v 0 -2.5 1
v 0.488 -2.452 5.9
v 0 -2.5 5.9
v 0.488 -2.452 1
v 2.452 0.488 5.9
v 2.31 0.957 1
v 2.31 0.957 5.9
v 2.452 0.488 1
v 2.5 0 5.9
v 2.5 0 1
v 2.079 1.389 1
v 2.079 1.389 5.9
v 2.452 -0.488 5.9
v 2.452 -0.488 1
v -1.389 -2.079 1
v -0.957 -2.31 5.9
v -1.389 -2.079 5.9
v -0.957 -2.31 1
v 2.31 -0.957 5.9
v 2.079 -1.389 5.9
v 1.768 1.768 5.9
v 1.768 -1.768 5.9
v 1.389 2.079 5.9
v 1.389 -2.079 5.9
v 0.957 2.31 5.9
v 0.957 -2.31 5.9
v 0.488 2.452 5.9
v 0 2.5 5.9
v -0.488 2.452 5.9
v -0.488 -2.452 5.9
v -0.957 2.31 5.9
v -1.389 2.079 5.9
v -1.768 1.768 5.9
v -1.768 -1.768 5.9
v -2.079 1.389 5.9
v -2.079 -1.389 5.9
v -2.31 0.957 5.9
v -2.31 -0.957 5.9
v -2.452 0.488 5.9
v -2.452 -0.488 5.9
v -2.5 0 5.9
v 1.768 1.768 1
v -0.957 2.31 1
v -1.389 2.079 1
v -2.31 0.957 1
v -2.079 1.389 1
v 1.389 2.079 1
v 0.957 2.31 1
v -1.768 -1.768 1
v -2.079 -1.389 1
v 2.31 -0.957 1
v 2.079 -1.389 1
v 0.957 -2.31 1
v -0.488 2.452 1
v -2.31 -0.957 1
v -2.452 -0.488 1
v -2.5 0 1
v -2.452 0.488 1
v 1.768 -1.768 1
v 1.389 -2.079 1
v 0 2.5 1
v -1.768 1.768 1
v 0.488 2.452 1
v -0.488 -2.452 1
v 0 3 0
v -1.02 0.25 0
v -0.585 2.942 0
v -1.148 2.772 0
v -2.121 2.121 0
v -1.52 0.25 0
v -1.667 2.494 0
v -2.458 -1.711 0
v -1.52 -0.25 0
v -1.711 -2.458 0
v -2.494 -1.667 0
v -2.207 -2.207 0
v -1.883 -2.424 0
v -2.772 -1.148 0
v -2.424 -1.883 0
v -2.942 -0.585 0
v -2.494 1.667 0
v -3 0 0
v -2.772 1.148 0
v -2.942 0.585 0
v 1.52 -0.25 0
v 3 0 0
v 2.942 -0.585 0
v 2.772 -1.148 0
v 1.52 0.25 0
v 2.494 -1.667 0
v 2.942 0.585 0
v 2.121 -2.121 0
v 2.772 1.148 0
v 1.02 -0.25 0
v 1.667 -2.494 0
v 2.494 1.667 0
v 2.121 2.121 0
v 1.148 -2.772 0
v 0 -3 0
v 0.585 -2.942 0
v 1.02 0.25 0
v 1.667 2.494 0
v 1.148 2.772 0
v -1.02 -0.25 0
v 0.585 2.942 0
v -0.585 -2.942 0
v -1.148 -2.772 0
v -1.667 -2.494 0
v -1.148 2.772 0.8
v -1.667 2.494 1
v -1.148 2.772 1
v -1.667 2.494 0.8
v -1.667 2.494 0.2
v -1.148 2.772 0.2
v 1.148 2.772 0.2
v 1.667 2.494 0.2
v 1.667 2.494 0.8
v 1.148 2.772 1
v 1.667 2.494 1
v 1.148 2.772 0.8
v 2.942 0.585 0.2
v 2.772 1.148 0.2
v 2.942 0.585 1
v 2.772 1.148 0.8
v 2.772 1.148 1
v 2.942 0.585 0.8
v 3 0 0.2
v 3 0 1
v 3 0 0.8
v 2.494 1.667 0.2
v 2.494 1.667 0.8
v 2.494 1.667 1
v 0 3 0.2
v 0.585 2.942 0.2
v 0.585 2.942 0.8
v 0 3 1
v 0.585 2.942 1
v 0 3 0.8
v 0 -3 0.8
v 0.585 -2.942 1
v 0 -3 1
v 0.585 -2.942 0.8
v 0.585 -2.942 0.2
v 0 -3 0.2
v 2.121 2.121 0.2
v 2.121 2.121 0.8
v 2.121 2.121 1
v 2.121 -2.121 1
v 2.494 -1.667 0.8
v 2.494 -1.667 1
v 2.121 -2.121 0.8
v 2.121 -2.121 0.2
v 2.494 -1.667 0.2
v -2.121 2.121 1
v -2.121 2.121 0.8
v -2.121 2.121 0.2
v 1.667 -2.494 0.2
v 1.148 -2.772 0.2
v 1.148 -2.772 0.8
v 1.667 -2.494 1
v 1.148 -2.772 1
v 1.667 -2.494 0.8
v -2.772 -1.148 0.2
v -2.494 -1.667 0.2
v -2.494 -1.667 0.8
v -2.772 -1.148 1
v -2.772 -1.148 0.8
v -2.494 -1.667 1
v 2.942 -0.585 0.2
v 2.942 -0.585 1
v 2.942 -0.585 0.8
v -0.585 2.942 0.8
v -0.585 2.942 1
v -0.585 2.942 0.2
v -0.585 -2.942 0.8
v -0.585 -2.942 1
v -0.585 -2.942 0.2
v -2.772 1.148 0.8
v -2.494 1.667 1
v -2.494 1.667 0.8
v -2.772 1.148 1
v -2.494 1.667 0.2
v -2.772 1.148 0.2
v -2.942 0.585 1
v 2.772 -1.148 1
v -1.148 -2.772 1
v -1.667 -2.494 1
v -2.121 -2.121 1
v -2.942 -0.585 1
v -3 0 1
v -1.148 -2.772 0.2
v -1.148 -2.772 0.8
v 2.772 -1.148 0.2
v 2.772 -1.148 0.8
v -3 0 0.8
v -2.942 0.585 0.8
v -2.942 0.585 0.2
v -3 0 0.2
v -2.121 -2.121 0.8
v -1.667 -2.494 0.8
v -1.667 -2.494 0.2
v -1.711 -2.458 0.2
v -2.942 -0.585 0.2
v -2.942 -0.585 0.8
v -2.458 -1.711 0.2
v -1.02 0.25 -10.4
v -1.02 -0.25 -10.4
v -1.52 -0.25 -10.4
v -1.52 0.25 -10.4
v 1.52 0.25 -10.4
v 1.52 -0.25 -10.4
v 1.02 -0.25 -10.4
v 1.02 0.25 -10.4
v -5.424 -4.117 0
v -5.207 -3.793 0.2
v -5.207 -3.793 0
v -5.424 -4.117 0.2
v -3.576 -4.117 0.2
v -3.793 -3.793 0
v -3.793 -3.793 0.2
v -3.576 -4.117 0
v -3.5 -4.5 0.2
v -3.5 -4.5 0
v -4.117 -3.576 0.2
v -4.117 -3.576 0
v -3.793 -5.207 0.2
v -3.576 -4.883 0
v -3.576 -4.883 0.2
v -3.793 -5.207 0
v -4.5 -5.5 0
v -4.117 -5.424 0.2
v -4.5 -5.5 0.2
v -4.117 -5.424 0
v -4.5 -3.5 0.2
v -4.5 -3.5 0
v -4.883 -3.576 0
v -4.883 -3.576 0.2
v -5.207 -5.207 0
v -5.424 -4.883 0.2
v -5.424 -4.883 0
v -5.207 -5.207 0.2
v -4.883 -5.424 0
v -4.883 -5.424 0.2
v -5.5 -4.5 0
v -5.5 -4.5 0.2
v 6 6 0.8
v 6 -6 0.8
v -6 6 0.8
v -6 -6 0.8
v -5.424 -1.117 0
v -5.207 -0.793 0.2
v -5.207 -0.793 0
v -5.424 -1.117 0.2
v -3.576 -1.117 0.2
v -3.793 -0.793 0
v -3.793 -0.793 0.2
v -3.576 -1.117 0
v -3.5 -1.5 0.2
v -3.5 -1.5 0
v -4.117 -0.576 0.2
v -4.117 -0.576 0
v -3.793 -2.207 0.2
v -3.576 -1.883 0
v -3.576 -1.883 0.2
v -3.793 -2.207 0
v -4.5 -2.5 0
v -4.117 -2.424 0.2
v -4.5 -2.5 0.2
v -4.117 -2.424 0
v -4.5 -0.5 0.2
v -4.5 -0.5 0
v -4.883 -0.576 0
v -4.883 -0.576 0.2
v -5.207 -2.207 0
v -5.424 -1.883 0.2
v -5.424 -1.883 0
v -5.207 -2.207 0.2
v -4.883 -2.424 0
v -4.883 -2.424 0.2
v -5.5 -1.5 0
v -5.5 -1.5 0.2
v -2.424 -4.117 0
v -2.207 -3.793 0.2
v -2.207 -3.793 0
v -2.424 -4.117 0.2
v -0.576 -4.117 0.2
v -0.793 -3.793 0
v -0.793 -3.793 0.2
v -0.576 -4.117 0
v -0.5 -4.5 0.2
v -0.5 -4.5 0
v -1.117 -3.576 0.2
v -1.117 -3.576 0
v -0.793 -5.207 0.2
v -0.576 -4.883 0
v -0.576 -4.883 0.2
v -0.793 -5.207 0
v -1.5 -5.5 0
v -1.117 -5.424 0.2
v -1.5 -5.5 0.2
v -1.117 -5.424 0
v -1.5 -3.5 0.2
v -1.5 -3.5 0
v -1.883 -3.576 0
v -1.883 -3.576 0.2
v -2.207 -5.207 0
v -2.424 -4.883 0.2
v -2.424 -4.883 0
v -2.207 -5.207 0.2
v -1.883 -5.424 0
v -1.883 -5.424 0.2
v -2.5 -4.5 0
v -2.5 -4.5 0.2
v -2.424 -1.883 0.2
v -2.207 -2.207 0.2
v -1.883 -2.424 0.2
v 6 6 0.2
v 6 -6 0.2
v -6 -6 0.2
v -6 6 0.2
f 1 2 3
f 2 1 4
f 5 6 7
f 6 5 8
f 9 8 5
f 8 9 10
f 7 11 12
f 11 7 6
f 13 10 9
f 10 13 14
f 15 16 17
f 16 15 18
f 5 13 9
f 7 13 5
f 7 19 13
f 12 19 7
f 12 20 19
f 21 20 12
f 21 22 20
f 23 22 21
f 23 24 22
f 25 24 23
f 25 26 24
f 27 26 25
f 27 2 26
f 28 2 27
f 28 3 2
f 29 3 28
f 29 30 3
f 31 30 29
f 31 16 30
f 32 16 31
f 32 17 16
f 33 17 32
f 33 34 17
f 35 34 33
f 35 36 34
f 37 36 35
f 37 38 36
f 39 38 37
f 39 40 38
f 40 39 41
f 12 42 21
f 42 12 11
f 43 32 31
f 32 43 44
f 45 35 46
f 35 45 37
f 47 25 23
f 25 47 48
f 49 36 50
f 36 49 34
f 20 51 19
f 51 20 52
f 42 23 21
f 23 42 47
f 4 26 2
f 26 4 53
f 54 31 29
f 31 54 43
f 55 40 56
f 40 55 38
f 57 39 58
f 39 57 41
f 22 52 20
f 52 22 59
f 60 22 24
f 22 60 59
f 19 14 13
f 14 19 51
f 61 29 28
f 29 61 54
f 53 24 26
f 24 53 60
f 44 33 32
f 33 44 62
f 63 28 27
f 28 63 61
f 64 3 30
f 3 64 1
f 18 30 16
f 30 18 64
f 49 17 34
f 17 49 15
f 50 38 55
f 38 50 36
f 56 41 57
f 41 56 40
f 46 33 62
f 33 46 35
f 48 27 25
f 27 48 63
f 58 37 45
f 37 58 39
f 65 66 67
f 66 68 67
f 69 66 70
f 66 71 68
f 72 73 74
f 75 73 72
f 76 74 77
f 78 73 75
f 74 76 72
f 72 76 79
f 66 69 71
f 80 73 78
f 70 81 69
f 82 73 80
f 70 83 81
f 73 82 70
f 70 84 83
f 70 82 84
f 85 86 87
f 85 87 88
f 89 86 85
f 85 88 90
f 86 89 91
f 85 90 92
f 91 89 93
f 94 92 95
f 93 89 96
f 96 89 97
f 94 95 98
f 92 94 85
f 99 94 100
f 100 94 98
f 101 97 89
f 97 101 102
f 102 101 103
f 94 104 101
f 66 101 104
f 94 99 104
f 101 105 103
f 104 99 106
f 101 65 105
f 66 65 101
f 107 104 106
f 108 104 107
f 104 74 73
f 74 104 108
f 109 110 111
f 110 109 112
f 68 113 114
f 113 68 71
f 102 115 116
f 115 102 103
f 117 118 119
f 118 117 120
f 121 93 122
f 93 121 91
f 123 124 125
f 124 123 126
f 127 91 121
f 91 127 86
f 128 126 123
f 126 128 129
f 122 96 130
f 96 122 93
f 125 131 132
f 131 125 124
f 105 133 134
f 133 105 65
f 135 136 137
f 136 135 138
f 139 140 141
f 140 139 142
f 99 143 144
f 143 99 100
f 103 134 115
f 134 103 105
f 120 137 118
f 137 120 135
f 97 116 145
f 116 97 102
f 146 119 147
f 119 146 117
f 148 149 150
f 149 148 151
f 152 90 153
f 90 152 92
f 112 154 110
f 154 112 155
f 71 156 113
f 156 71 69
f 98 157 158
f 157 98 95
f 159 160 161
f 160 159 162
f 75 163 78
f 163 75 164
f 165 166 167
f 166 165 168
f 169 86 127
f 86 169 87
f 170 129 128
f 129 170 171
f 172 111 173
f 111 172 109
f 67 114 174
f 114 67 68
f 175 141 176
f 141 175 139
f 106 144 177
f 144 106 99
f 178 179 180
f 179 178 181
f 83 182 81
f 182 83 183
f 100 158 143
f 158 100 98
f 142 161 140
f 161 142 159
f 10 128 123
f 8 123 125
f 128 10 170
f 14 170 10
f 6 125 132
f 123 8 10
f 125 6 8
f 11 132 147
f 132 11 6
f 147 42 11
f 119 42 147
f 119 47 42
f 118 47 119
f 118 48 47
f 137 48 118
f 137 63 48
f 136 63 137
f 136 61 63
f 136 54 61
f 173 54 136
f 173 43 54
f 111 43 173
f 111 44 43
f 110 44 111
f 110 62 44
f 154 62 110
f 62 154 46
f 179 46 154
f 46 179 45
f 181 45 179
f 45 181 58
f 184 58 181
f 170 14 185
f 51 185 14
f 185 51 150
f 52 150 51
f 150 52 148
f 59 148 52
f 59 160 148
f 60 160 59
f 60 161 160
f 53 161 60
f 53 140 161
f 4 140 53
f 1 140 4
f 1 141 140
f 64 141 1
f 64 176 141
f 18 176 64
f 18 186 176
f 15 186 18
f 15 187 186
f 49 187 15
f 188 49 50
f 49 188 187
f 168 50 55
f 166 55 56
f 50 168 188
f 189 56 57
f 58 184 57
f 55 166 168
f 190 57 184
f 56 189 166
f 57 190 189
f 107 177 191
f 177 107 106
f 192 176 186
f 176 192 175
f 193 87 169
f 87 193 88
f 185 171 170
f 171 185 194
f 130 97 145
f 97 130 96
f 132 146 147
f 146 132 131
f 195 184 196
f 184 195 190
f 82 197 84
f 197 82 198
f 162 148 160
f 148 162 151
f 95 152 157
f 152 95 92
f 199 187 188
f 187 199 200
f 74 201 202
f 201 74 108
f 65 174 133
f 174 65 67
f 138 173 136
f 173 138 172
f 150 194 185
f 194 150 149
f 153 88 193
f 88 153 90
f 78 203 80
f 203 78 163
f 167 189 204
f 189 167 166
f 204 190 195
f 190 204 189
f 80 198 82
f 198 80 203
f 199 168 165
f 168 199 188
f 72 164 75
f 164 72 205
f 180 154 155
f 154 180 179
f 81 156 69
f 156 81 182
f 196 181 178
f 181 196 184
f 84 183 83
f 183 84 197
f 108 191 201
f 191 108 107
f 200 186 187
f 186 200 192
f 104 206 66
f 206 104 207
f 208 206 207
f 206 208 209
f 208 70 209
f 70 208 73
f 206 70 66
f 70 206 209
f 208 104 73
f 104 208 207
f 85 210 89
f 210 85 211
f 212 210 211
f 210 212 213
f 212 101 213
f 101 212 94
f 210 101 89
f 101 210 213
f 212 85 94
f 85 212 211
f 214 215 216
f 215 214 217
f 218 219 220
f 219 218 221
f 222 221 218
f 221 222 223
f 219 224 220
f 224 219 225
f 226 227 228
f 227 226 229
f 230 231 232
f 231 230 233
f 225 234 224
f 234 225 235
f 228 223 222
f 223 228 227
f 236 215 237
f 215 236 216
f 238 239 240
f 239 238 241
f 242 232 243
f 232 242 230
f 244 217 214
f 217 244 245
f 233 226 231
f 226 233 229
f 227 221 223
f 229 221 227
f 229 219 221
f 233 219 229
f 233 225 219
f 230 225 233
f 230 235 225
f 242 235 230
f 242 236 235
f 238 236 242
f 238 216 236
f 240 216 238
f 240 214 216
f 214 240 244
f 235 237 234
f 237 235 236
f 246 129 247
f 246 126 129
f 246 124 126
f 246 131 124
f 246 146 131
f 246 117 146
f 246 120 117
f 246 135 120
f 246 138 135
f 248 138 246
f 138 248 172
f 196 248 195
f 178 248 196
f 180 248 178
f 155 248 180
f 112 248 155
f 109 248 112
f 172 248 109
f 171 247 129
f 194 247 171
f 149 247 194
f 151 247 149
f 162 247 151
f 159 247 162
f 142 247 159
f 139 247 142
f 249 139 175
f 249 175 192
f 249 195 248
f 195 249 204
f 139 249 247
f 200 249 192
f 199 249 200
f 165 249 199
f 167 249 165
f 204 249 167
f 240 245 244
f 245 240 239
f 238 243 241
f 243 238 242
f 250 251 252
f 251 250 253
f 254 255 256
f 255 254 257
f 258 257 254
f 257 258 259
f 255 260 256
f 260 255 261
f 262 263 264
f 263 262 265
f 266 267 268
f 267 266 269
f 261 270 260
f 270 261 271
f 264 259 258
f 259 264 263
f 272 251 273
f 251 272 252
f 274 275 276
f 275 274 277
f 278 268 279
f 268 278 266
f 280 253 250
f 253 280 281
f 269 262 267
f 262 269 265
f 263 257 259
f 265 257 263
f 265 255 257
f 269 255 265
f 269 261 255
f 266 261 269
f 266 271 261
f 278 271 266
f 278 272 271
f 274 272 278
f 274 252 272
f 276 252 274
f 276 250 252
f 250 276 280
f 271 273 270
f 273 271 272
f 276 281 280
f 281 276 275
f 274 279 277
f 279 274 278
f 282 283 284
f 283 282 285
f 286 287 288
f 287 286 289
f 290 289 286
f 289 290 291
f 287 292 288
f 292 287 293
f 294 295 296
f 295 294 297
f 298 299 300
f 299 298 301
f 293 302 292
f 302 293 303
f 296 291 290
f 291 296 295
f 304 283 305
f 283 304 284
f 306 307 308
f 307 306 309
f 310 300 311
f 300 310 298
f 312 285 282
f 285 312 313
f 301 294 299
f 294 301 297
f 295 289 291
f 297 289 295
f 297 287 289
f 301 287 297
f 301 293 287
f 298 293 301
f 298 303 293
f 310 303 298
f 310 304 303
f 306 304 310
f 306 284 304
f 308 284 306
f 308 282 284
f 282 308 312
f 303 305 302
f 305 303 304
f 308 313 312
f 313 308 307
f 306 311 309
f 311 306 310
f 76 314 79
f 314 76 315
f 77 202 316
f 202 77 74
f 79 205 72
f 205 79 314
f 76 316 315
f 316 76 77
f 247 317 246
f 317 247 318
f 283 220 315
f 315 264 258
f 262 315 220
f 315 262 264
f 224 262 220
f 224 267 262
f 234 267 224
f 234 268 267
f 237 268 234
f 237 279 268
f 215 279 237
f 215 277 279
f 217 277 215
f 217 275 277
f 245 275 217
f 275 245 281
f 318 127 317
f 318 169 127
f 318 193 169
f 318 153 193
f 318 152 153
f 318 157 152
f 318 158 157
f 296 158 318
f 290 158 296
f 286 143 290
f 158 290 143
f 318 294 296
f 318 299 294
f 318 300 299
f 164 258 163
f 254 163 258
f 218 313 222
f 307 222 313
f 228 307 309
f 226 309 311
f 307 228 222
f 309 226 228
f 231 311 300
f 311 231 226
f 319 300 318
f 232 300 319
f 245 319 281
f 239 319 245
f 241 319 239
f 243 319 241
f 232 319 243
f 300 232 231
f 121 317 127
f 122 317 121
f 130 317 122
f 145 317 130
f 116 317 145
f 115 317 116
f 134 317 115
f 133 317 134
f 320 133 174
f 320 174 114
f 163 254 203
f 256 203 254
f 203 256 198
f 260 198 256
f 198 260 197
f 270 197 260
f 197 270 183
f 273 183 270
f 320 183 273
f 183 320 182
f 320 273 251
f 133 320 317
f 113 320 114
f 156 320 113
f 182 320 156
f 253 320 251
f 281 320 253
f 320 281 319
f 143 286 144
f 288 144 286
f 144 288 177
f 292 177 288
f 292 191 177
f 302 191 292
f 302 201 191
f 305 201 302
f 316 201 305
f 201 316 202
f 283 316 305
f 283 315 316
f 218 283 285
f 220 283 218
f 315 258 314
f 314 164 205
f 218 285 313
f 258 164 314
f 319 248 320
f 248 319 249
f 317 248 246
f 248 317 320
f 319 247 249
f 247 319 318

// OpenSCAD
// Parameters
led_diameter_mm = 5; //[2.5:10:0.1]
body_height_mm = 5.9; //[3:12:0.1]
rim_thickness_mm = 1; //[0.5:2:0.1]
rim_diameter_mm = 6; //[5.2:12:0.1]
lead_pitch_mm = 2.54; //[1.5:5.08:0.01]
lead_thickness_mm = 0.5; //[0.3:1:0.05]
lead_length_mm = 10; //[5:25:0.5]
eps_mm = 0.8; //[0.2:2:0.1]
grill_width_mm = 12; //[6:24:0.5]
grill_height_mm = 12; //[6:24:0.5]
grill_hole_d_mm = 2; //[1:4:0.1]
grill_gap_mm = 1; //[0.5:3:0.1]
grill_marker_h_mm = 0.8; //[0.4:2:0.1]
grill_carrier_t_mm = 0.6; //[0.3:2:0.1]

// LED Module
module led() {
  color("red") {
    // LED Body
    translate([0, 0, body_height_mm/2])
      cylinder(r=led_diameter_mm/2, h=body_height_mm, center=true, $fn=32);
    
    // Rim Flange
    translate([0, 0, rim_thickness_mm/2])
      cylinder(r=rim_diameter_mm/2, h=rim_thickness_mm, center=true, $fn=32);
    
    // Leads
    translate([-lead_pitch_mm/2, 0, -(lead_length_mm + eps_mm)/2 + eps_mm/2])
      cube([lead_thickness_mm, lead_thickness_mm, lead_length_mm + eps_mm], center=true);
    translate([lead_pitch_mm/2, 0, -(lead_length_mm + eps_mm)/2 + eps_mm/2])
      cube([lead_thickness_mm, lead_thickness_mm, lead_length_mm + eps_mm], center=true);
  }
}

// Grill Hole Positions Module
module grill_hole_positions() {
  color("Silver") {
    // Carrier Plate
    translate([0, 0, rim_thickness_mm/2])
      cube([grill_width_mm, grill_height_mm, grill_carrier_t_mm], center=true);
    
    // Grill Markers
    for (x = [0:1]) {
      for (y = [0:1]) {
        translate([
          -grill_width_mm/2 + (x + 0.5) * (grill_width_mm / (floor(grill_width_mm / (grill_hole_d_mm + grill_gap_mm)))),
          -grill_height_mm/2 + (y + 0.5) * (grill_height_mm / (floor(grill_height_mm / ((grill_hole_d_mm + grill_gap_mm) * cos(30))))),
          rim_thickness_mm/2 + grill_carrier_t_mm/2 - eps_mm/2
        ])
        cylinder(r=grill_hole_d_mm/2, h=grill_marker_h_mm, center=true, $fn=16);
      }
    }
  }
}

// Assembly
module assembly() {
  led();
  grill_hole_positions();
}

assembly();
